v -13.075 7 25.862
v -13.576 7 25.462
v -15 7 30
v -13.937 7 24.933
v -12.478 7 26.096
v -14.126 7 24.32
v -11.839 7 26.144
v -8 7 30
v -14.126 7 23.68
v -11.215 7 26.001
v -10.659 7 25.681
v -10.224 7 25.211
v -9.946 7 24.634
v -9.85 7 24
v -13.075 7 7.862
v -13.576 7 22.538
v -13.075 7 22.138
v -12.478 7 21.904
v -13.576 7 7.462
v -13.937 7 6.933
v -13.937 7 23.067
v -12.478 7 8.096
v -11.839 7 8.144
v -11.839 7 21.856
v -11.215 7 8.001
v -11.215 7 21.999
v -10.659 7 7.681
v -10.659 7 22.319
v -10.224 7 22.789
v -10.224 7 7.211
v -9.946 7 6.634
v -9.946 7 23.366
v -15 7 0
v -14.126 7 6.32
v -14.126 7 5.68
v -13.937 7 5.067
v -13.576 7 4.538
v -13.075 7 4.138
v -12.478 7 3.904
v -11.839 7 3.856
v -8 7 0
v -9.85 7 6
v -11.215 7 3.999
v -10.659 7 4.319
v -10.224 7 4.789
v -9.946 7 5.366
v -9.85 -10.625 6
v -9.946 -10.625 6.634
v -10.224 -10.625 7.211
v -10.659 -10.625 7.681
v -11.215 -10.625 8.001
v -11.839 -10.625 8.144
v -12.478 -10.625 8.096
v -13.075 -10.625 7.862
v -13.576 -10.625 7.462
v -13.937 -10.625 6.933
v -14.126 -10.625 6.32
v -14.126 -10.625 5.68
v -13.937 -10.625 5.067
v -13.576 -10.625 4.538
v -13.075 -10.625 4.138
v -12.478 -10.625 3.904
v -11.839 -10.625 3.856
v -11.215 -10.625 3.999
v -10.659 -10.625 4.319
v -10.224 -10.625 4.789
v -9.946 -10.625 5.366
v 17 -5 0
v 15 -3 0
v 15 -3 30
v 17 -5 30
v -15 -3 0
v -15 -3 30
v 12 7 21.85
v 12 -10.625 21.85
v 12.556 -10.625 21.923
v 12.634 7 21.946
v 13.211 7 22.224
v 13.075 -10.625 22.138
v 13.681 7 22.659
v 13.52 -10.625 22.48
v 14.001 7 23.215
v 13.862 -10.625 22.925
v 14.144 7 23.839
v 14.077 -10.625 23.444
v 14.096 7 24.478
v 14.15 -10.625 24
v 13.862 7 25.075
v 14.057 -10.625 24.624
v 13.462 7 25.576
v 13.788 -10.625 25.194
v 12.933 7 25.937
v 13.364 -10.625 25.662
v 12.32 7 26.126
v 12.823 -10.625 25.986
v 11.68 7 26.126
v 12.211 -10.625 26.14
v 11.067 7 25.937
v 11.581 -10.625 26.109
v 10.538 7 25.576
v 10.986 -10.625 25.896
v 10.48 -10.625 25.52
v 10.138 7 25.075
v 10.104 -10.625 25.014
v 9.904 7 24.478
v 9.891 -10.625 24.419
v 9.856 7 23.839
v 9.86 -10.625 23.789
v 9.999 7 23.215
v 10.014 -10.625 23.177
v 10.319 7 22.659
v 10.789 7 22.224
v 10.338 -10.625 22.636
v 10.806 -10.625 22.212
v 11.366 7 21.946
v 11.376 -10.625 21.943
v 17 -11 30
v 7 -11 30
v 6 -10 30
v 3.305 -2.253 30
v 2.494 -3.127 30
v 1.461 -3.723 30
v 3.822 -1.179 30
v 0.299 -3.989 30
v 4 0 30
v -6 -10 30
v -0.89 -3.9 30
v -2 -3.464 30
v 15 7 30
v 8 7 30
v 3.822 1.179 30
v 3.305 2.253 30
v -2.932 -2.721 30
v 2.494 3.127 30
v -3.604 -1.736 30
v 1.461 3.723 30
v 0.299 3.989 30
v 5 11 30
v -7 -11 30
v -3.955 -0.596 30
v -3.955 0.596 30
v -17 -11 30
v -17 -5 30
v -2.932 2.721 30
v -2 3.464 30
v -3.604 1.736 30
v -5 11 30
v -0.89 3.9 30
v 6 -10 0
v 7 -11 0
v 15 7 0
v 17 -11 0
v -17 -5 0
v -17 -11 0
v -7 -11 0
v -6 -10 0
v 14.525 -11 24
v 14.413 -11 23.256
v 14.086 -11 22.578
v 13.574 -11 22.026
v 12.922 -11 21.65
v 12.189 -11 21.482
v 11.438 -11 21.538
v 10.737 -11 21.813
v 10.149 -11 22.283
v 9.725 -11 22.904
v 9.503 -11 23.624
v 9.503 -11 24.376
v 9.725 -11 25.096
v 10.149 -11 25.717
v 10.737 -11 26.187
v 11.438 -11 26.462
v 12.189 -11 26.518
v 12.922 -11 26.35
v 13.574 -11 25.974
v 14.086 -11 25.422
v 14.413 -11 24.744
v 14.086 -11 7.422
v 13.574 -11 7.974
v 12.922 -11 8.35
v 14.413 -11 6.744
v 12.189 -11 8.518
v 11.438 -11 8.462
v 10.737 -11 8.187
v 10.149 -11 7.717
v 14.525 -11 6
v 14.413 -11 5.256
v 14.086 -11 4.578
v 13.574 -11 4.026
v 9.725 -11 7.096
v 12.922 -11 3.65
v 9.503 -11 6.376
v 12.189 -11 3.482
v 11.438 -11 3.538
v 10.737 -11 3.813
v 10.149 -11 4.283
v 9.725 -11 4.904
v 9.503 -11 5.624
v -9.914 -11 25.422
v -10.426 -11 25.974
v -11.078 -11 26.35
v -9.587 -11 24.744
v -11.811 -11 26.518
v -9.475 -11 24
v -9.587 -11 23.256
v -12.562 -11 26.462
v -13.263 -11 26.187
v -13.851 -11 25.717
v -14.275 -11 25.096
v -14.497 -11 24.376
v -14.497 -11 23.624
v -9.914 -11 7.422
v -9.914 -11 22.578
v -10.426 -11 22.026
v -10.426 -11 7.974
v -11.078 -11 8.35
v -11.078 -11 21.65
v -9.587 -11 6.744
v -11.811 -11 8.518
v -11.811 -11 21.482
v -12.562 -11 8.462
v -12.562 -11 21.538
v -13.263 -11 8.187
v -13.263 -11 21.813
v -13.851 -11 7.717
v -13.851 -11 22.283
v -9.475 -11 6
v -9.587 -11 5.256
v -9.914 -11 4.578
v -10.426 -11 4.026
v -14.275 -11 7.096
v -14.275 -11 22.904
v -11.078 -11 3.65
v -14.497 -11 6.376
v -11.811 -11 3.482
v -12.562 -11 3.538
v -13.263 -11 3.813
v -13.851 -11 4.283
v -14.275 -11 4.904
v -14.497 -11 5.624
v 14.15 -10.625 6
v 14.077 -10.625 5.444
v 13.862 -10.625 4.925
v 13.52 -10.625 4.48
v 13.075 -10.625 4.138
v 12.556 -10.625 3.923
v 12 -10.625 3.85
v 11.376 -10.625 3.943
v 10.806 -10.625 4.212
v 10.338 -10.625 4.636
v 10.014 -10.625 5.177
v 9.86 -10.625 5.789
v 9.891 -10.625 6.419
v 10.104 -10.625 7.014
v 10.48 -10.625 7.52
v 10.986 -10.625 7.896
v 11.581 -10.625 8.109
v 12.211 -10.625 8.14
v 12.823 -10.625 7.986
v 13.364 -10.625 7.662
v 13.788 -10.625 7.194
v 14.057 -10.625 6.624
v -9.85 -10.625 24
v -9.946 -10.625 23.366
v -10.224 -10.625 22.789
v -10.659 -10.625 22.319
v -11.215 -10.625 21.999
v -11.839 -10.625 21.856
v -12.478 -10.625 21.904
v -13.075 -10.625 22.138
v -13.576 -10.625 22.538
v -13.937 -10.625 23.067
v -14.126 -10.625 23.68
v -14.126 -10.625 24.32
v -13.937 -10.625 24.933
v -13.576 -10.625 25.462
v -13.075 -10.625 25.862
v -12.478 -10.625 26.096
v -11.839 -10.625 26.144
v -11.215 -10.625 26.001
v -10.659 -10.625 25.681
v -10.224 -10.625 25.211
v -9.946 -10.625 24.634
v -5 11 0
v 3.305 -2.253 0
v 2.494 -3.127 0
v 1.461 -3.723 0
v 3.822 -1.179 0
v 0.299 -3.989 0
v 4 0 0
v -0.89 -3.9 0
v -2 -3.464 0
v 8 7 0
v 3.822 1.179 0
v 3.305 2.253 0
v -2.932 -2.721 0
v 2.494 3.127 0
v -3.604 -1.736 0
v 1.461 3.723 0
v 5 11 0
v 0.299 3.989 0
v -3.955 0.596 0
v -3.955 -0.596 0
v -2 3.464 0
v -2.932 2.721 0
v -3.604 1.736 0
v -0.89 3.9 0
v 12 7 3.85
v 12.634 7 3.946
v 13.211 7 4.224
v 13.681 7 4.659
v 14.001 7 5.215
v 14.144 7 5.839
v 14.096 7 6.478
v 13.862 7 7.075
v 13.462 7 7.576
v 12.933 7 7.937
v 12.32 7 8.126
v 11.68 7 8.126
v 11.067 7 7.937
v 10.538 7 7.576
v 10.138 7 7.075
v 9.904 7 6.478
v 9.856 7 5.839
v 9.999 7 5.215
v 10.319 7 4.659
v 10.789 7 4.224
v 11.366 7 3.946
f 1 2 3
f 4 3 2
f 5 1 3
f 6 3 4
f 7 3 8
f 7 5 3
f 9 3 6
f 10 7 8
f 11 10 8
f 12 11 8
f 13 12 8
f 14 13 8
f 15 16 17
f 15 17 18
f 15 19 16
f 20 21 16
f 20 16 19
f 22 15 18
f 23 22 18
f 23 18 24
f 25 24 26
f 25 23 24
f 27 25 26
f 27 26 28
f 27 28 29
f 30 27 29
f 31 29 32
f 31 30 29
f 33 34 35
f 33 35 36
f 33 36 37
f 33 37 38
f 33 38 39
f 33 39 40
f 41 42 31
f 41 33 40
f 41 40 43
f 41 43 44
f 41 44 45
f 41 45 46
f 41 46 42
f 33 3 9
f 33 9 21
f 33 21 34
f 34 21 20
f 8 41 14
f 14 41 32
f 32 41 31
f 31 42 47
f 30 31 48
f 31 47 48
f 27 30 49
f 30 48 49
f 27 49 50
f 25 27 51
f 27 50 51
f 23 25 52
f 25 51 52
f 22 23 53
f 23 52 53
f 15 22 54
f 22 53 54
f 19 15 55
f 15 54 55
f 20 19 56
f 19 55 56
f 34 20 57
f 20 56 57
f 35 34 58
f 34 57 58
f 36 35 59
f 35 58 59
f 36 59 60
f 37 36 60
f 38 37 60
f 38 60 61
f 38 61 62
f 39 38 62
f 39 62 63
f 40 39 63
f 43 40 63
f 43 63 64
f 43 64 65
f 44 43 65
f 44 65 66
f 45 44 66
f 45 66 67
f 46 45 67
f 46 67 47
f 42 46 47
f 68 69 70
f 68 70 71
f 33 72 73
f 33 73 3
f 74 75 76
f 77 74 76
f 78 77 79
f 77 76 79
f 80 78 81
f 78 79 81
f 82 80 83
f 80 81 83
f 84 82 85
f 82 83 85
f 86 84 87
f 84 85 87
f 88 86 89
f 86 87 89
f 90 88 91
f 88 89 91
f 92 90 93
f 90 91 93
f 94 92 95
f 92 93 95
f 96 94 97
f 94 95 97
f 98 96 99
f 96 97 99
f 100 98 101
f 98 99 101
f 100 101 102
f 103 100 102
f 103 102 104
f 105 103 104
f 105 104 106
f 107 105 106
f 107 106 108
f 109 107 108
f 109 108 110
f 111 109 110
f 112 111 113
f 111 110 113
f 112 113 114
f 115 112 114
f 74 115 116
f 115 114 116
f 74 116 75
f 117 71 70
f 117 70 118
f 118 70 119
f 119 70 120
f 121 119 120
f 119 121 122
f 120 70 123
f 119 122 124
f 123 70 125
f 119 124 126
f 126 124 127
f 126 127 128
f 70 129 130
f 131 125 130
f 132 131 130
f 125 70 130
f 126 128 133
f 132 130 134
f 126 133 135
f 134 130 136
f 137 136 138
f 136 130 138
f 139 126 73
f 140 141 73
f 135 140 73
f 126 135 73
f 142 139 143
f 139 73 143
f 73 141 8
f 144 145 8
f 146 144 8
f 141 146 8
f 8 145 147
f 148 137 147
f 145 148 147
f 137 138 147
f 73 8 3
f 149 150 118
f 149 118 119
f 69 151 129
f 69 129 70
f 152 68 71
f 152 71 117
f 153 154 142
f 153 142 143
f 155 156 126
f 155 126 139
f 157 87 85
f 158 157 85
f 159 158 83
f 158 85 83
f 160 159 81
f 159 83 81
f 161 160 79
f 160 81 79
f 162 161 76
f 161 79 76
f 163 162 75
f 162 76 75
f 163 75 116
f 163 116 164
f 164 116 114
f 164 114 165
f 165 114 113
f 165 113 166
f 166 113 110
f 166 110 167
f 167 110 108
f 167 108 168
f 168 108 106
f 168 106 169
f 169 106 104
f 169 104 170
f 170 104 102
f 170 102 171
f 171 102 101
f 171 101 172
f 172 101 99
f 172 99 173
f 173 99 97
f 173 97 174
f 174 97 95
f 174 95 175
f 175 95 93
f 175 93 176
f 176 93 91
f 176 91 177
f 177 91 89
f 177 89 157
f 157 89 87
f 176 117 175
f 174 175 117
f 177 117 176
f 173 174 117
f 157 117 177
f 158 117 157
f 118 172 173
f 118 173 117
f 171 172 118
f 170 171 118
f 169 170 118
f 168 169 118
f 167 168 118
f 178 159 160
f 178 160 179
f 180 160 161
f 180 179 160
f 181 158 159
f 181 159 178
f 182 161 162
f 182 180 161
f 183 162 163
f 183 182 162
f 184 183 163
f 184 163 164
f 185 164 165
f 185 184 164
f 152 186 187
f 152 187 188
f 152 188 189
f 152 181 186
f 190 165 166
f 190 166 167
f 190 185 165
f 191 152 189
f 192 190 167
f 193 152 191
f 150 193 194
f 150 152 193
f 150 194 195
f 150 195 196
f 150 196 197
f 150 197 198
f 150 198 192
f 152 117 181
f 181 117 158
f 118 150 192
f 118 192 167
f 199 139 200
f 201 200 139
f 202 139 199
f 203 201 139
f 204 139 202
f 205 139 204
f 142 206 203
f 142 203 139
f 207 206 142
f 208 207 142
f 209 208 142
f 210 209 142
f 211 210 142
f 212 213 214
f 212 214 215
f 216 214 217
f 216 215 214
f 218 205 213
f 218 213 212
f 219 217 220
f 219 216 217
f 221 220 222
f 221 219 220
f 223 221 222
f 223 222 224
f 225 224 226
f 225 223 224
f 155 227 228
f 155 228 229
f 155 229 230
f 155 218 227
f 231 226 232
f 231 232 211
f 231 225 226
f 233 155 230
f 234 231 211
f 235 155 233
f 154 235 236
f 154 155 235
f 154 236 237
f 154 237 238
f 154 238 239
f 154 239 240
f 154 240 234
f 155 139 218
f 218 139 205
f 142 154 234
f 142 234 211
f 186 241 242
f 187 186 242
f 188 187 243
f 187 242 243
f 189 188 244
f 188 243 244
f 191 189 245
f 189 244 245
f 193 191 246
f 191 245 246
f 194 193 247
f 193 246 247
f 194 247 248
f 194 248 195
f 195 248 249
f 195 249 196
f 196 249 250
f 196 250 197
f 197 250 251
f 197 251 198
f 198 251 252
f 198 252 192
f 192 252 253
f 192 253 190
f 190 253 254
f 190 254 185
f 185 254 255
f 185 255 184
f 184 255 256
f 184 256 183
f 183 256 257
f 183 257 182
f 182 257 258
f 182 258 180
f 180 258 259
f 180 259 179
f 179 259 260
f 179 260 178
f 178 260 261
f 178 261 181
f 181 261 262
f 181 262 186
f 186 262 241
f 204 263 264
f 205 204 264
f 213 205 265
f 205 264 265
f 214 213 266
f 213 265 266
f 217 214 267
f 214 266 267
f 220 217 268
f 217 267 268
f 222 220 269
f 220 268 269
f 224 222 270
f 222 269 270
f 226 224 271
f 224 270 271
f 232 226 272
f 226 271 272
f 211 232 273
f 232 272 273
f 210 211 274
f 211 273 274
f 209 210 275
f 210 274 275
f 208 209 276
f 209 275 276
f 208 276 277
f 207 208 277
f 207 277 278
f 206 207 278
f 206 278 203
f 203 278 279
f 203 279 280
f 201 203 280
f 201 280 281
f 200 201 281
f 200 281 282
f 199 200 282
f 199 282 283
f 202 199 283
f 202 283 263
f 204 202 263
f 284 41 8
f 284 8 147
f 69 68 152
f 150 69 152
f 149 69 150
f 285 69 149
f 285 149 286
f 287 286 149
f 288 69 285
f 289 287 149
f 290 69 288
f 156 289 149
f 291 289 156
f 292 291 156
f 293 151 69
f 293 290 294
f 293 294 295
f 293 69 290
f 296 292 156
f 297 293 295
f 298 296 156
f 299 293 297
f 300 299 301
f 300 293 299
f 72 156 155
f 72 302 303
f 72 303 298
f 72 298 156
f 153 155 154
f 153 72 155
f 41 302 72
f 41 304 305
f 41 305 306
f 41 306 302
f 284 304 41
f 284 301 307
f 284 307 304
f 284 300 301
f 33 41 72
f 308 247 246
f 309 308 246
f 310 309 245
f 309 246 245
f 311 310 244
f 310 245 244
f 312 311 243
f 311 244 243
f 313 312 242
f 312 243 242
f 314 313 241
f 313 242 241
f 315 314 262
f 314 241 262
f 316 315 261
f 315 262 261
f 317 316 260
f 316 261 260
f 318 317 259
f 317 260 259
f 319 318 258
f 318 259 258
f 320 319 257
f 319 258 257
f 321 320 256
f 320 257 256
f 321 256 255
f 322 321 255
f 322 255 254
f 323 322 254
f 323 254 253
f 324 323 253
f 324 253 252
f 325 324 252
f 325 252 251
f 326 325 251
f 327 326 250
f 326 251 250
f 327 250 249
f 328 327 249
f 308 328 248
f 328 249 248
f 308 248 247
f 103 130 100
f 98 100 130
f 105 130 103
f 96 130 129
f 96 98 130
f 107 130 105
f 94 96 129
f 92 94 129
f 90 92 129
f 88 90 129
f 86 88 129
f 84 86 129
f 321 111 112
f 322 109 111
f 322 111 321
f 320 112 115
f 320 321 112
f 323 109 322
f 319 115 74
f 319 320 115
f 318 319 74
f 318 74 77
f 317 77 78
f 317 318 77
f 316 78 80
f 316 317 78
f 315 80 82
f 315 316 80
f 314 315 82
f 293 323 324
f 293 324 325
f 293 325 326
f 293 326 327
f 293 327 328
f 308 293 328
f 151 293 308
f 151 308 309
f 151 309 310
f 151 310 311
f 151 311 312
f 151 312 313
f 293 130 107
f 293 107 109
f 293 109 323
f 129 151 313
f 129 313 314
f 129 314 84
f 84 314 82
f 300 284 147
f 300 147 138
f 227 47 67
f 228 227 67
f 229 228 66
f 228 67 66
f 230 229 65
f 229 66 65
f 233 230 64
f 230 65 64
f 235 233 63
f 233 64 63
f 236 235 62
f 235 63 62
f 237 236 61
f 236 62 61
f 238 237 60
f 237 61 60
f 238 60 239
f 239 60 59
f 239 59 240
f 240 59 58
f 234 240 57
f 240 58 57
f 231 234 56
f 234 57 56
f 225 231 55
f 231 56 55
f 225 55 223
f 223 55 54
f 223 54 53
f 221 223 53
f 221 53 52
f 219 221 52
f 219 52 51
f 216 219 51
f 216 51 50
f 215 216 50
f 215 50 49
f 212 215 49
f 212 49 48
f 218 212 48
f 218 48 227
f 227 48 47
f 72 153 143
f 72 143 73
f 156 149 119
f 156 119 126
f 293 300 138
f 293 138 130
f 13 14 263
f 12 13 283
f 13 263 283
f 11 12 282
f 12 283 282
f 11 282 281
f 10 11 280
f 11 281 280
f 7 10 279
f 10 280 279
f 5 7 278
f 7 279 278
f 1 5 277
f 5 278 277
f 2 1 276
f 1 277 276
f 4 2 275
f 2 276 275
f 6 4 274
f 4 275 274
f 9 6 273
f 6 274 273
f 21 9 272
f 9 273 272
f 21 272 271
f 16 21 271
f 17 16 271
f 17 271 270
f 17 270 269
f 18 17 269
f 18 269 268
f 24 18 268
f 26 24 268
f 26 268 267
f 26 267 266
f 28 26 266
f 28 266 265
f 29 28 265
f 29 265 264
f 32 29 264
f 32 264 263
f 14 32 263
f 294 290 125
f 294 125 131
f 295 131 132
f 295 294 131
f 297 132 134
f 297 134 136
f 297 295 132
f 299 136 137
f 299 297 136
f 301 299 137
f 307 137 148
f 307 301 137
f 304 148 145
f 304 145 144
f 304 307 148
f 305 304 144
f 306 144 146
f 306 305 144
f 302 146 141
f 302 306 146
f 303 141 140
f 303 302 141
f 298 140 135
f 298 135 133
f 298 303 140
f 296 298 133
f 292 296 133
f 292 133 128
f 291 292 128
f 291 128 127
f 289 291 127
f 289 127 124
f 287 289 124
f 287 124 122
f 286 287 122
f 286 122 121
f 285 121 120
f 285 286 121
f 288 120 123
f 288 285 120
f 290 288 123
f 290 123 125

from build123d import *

# Parameters (mm, degrees)
SKETCH_1_R                   = 4
EXTRUDE_1_DEPTH              = 30
HOLE_WIZARD_M5_1_D           = 4.2
HOLE_WIZARD_M5_1_DEPTH       = 18
HOLE_WIZARD_M5_1_CSINK_D     = 5.05
HOLE_WIZARD_M5_1_CSINK_ANGLE = 90
HOLE_WIZARD_M5_1_TIP         = 1.2618073
SKETCH_4_R                   = 2.15
CUT_EXTRUDE_1_DEPTH          = 30


with BuildPart() as part:
    # 草图1 → 凸台-拉伸1 (new body)
    with BuildSketch(Plane.XY):
        Polygon((-5, 11), (5, 11), (8, 7), (15, 7), (15, -3), (17, -5), (17, -11), (7, -11), (6, -10), (-6, -10), (-7, -11), (-17, -11), (-17, -5), (-15, -3), (-15, 7), (-8, 7), align=None)
        Circle(SKETCH_1_R, mode=Mode.SUBTRACT)
    extrude(amount=EXTRUDE_1_DEPTH)

    # M5 螺纹孔1
    with Locations(Plane(origin=(0, -11, 0), x_dir=(-1, 0, 0), z_dir=(0, -1, 0))):
        with Locations((12, -24), (12, -6), (-12, -24), (-12, -6)):
            CounterSinkHole(HOLE_WIZARD_M5_1_D / 2, HOLE_WIZARD_M5_1_CSINK_D / 2, depth=HOLE_WIZARD_M5_1_DEPTH, counter_sink_angle=HOLE_WIZARD_M5_1_CSINK_ANGLE)
            with Locations((0, 0, -(HOLE_WIZARD_M5_1_DEPTH + HOLE_WIZARD_M5_1_TIP / 2))):  # 118° drill point
                Cone(0, HOLE_WIZARD_M5_1_D / 2, HOLE_WIZARD_M5_1_TIP, mode=Mode.SUBTRACT)

    # 草图4 → 切除-拉伸1 (cut)
    with BuildSketch(Plane.XZ.offset(11)):
        with Locations((-12, 24)):
            Circle(SKETCH_4_R)
        with Locations(Location((12, 24, 0), (0, 0, 270))):
            Circle(SKETCH_4_R)
        with Locations(Location((12, 6, 0), (0, 0, 270))):
            Circle(SKETCH_4_R)
        with Locations((-12, 6)):
            Circle(SKETCH_4_R)
    extrude(amount=-CUT_EXTRUDE_1_DEPTH, mode=Mode.SUBTRACT)


solid = part.part
